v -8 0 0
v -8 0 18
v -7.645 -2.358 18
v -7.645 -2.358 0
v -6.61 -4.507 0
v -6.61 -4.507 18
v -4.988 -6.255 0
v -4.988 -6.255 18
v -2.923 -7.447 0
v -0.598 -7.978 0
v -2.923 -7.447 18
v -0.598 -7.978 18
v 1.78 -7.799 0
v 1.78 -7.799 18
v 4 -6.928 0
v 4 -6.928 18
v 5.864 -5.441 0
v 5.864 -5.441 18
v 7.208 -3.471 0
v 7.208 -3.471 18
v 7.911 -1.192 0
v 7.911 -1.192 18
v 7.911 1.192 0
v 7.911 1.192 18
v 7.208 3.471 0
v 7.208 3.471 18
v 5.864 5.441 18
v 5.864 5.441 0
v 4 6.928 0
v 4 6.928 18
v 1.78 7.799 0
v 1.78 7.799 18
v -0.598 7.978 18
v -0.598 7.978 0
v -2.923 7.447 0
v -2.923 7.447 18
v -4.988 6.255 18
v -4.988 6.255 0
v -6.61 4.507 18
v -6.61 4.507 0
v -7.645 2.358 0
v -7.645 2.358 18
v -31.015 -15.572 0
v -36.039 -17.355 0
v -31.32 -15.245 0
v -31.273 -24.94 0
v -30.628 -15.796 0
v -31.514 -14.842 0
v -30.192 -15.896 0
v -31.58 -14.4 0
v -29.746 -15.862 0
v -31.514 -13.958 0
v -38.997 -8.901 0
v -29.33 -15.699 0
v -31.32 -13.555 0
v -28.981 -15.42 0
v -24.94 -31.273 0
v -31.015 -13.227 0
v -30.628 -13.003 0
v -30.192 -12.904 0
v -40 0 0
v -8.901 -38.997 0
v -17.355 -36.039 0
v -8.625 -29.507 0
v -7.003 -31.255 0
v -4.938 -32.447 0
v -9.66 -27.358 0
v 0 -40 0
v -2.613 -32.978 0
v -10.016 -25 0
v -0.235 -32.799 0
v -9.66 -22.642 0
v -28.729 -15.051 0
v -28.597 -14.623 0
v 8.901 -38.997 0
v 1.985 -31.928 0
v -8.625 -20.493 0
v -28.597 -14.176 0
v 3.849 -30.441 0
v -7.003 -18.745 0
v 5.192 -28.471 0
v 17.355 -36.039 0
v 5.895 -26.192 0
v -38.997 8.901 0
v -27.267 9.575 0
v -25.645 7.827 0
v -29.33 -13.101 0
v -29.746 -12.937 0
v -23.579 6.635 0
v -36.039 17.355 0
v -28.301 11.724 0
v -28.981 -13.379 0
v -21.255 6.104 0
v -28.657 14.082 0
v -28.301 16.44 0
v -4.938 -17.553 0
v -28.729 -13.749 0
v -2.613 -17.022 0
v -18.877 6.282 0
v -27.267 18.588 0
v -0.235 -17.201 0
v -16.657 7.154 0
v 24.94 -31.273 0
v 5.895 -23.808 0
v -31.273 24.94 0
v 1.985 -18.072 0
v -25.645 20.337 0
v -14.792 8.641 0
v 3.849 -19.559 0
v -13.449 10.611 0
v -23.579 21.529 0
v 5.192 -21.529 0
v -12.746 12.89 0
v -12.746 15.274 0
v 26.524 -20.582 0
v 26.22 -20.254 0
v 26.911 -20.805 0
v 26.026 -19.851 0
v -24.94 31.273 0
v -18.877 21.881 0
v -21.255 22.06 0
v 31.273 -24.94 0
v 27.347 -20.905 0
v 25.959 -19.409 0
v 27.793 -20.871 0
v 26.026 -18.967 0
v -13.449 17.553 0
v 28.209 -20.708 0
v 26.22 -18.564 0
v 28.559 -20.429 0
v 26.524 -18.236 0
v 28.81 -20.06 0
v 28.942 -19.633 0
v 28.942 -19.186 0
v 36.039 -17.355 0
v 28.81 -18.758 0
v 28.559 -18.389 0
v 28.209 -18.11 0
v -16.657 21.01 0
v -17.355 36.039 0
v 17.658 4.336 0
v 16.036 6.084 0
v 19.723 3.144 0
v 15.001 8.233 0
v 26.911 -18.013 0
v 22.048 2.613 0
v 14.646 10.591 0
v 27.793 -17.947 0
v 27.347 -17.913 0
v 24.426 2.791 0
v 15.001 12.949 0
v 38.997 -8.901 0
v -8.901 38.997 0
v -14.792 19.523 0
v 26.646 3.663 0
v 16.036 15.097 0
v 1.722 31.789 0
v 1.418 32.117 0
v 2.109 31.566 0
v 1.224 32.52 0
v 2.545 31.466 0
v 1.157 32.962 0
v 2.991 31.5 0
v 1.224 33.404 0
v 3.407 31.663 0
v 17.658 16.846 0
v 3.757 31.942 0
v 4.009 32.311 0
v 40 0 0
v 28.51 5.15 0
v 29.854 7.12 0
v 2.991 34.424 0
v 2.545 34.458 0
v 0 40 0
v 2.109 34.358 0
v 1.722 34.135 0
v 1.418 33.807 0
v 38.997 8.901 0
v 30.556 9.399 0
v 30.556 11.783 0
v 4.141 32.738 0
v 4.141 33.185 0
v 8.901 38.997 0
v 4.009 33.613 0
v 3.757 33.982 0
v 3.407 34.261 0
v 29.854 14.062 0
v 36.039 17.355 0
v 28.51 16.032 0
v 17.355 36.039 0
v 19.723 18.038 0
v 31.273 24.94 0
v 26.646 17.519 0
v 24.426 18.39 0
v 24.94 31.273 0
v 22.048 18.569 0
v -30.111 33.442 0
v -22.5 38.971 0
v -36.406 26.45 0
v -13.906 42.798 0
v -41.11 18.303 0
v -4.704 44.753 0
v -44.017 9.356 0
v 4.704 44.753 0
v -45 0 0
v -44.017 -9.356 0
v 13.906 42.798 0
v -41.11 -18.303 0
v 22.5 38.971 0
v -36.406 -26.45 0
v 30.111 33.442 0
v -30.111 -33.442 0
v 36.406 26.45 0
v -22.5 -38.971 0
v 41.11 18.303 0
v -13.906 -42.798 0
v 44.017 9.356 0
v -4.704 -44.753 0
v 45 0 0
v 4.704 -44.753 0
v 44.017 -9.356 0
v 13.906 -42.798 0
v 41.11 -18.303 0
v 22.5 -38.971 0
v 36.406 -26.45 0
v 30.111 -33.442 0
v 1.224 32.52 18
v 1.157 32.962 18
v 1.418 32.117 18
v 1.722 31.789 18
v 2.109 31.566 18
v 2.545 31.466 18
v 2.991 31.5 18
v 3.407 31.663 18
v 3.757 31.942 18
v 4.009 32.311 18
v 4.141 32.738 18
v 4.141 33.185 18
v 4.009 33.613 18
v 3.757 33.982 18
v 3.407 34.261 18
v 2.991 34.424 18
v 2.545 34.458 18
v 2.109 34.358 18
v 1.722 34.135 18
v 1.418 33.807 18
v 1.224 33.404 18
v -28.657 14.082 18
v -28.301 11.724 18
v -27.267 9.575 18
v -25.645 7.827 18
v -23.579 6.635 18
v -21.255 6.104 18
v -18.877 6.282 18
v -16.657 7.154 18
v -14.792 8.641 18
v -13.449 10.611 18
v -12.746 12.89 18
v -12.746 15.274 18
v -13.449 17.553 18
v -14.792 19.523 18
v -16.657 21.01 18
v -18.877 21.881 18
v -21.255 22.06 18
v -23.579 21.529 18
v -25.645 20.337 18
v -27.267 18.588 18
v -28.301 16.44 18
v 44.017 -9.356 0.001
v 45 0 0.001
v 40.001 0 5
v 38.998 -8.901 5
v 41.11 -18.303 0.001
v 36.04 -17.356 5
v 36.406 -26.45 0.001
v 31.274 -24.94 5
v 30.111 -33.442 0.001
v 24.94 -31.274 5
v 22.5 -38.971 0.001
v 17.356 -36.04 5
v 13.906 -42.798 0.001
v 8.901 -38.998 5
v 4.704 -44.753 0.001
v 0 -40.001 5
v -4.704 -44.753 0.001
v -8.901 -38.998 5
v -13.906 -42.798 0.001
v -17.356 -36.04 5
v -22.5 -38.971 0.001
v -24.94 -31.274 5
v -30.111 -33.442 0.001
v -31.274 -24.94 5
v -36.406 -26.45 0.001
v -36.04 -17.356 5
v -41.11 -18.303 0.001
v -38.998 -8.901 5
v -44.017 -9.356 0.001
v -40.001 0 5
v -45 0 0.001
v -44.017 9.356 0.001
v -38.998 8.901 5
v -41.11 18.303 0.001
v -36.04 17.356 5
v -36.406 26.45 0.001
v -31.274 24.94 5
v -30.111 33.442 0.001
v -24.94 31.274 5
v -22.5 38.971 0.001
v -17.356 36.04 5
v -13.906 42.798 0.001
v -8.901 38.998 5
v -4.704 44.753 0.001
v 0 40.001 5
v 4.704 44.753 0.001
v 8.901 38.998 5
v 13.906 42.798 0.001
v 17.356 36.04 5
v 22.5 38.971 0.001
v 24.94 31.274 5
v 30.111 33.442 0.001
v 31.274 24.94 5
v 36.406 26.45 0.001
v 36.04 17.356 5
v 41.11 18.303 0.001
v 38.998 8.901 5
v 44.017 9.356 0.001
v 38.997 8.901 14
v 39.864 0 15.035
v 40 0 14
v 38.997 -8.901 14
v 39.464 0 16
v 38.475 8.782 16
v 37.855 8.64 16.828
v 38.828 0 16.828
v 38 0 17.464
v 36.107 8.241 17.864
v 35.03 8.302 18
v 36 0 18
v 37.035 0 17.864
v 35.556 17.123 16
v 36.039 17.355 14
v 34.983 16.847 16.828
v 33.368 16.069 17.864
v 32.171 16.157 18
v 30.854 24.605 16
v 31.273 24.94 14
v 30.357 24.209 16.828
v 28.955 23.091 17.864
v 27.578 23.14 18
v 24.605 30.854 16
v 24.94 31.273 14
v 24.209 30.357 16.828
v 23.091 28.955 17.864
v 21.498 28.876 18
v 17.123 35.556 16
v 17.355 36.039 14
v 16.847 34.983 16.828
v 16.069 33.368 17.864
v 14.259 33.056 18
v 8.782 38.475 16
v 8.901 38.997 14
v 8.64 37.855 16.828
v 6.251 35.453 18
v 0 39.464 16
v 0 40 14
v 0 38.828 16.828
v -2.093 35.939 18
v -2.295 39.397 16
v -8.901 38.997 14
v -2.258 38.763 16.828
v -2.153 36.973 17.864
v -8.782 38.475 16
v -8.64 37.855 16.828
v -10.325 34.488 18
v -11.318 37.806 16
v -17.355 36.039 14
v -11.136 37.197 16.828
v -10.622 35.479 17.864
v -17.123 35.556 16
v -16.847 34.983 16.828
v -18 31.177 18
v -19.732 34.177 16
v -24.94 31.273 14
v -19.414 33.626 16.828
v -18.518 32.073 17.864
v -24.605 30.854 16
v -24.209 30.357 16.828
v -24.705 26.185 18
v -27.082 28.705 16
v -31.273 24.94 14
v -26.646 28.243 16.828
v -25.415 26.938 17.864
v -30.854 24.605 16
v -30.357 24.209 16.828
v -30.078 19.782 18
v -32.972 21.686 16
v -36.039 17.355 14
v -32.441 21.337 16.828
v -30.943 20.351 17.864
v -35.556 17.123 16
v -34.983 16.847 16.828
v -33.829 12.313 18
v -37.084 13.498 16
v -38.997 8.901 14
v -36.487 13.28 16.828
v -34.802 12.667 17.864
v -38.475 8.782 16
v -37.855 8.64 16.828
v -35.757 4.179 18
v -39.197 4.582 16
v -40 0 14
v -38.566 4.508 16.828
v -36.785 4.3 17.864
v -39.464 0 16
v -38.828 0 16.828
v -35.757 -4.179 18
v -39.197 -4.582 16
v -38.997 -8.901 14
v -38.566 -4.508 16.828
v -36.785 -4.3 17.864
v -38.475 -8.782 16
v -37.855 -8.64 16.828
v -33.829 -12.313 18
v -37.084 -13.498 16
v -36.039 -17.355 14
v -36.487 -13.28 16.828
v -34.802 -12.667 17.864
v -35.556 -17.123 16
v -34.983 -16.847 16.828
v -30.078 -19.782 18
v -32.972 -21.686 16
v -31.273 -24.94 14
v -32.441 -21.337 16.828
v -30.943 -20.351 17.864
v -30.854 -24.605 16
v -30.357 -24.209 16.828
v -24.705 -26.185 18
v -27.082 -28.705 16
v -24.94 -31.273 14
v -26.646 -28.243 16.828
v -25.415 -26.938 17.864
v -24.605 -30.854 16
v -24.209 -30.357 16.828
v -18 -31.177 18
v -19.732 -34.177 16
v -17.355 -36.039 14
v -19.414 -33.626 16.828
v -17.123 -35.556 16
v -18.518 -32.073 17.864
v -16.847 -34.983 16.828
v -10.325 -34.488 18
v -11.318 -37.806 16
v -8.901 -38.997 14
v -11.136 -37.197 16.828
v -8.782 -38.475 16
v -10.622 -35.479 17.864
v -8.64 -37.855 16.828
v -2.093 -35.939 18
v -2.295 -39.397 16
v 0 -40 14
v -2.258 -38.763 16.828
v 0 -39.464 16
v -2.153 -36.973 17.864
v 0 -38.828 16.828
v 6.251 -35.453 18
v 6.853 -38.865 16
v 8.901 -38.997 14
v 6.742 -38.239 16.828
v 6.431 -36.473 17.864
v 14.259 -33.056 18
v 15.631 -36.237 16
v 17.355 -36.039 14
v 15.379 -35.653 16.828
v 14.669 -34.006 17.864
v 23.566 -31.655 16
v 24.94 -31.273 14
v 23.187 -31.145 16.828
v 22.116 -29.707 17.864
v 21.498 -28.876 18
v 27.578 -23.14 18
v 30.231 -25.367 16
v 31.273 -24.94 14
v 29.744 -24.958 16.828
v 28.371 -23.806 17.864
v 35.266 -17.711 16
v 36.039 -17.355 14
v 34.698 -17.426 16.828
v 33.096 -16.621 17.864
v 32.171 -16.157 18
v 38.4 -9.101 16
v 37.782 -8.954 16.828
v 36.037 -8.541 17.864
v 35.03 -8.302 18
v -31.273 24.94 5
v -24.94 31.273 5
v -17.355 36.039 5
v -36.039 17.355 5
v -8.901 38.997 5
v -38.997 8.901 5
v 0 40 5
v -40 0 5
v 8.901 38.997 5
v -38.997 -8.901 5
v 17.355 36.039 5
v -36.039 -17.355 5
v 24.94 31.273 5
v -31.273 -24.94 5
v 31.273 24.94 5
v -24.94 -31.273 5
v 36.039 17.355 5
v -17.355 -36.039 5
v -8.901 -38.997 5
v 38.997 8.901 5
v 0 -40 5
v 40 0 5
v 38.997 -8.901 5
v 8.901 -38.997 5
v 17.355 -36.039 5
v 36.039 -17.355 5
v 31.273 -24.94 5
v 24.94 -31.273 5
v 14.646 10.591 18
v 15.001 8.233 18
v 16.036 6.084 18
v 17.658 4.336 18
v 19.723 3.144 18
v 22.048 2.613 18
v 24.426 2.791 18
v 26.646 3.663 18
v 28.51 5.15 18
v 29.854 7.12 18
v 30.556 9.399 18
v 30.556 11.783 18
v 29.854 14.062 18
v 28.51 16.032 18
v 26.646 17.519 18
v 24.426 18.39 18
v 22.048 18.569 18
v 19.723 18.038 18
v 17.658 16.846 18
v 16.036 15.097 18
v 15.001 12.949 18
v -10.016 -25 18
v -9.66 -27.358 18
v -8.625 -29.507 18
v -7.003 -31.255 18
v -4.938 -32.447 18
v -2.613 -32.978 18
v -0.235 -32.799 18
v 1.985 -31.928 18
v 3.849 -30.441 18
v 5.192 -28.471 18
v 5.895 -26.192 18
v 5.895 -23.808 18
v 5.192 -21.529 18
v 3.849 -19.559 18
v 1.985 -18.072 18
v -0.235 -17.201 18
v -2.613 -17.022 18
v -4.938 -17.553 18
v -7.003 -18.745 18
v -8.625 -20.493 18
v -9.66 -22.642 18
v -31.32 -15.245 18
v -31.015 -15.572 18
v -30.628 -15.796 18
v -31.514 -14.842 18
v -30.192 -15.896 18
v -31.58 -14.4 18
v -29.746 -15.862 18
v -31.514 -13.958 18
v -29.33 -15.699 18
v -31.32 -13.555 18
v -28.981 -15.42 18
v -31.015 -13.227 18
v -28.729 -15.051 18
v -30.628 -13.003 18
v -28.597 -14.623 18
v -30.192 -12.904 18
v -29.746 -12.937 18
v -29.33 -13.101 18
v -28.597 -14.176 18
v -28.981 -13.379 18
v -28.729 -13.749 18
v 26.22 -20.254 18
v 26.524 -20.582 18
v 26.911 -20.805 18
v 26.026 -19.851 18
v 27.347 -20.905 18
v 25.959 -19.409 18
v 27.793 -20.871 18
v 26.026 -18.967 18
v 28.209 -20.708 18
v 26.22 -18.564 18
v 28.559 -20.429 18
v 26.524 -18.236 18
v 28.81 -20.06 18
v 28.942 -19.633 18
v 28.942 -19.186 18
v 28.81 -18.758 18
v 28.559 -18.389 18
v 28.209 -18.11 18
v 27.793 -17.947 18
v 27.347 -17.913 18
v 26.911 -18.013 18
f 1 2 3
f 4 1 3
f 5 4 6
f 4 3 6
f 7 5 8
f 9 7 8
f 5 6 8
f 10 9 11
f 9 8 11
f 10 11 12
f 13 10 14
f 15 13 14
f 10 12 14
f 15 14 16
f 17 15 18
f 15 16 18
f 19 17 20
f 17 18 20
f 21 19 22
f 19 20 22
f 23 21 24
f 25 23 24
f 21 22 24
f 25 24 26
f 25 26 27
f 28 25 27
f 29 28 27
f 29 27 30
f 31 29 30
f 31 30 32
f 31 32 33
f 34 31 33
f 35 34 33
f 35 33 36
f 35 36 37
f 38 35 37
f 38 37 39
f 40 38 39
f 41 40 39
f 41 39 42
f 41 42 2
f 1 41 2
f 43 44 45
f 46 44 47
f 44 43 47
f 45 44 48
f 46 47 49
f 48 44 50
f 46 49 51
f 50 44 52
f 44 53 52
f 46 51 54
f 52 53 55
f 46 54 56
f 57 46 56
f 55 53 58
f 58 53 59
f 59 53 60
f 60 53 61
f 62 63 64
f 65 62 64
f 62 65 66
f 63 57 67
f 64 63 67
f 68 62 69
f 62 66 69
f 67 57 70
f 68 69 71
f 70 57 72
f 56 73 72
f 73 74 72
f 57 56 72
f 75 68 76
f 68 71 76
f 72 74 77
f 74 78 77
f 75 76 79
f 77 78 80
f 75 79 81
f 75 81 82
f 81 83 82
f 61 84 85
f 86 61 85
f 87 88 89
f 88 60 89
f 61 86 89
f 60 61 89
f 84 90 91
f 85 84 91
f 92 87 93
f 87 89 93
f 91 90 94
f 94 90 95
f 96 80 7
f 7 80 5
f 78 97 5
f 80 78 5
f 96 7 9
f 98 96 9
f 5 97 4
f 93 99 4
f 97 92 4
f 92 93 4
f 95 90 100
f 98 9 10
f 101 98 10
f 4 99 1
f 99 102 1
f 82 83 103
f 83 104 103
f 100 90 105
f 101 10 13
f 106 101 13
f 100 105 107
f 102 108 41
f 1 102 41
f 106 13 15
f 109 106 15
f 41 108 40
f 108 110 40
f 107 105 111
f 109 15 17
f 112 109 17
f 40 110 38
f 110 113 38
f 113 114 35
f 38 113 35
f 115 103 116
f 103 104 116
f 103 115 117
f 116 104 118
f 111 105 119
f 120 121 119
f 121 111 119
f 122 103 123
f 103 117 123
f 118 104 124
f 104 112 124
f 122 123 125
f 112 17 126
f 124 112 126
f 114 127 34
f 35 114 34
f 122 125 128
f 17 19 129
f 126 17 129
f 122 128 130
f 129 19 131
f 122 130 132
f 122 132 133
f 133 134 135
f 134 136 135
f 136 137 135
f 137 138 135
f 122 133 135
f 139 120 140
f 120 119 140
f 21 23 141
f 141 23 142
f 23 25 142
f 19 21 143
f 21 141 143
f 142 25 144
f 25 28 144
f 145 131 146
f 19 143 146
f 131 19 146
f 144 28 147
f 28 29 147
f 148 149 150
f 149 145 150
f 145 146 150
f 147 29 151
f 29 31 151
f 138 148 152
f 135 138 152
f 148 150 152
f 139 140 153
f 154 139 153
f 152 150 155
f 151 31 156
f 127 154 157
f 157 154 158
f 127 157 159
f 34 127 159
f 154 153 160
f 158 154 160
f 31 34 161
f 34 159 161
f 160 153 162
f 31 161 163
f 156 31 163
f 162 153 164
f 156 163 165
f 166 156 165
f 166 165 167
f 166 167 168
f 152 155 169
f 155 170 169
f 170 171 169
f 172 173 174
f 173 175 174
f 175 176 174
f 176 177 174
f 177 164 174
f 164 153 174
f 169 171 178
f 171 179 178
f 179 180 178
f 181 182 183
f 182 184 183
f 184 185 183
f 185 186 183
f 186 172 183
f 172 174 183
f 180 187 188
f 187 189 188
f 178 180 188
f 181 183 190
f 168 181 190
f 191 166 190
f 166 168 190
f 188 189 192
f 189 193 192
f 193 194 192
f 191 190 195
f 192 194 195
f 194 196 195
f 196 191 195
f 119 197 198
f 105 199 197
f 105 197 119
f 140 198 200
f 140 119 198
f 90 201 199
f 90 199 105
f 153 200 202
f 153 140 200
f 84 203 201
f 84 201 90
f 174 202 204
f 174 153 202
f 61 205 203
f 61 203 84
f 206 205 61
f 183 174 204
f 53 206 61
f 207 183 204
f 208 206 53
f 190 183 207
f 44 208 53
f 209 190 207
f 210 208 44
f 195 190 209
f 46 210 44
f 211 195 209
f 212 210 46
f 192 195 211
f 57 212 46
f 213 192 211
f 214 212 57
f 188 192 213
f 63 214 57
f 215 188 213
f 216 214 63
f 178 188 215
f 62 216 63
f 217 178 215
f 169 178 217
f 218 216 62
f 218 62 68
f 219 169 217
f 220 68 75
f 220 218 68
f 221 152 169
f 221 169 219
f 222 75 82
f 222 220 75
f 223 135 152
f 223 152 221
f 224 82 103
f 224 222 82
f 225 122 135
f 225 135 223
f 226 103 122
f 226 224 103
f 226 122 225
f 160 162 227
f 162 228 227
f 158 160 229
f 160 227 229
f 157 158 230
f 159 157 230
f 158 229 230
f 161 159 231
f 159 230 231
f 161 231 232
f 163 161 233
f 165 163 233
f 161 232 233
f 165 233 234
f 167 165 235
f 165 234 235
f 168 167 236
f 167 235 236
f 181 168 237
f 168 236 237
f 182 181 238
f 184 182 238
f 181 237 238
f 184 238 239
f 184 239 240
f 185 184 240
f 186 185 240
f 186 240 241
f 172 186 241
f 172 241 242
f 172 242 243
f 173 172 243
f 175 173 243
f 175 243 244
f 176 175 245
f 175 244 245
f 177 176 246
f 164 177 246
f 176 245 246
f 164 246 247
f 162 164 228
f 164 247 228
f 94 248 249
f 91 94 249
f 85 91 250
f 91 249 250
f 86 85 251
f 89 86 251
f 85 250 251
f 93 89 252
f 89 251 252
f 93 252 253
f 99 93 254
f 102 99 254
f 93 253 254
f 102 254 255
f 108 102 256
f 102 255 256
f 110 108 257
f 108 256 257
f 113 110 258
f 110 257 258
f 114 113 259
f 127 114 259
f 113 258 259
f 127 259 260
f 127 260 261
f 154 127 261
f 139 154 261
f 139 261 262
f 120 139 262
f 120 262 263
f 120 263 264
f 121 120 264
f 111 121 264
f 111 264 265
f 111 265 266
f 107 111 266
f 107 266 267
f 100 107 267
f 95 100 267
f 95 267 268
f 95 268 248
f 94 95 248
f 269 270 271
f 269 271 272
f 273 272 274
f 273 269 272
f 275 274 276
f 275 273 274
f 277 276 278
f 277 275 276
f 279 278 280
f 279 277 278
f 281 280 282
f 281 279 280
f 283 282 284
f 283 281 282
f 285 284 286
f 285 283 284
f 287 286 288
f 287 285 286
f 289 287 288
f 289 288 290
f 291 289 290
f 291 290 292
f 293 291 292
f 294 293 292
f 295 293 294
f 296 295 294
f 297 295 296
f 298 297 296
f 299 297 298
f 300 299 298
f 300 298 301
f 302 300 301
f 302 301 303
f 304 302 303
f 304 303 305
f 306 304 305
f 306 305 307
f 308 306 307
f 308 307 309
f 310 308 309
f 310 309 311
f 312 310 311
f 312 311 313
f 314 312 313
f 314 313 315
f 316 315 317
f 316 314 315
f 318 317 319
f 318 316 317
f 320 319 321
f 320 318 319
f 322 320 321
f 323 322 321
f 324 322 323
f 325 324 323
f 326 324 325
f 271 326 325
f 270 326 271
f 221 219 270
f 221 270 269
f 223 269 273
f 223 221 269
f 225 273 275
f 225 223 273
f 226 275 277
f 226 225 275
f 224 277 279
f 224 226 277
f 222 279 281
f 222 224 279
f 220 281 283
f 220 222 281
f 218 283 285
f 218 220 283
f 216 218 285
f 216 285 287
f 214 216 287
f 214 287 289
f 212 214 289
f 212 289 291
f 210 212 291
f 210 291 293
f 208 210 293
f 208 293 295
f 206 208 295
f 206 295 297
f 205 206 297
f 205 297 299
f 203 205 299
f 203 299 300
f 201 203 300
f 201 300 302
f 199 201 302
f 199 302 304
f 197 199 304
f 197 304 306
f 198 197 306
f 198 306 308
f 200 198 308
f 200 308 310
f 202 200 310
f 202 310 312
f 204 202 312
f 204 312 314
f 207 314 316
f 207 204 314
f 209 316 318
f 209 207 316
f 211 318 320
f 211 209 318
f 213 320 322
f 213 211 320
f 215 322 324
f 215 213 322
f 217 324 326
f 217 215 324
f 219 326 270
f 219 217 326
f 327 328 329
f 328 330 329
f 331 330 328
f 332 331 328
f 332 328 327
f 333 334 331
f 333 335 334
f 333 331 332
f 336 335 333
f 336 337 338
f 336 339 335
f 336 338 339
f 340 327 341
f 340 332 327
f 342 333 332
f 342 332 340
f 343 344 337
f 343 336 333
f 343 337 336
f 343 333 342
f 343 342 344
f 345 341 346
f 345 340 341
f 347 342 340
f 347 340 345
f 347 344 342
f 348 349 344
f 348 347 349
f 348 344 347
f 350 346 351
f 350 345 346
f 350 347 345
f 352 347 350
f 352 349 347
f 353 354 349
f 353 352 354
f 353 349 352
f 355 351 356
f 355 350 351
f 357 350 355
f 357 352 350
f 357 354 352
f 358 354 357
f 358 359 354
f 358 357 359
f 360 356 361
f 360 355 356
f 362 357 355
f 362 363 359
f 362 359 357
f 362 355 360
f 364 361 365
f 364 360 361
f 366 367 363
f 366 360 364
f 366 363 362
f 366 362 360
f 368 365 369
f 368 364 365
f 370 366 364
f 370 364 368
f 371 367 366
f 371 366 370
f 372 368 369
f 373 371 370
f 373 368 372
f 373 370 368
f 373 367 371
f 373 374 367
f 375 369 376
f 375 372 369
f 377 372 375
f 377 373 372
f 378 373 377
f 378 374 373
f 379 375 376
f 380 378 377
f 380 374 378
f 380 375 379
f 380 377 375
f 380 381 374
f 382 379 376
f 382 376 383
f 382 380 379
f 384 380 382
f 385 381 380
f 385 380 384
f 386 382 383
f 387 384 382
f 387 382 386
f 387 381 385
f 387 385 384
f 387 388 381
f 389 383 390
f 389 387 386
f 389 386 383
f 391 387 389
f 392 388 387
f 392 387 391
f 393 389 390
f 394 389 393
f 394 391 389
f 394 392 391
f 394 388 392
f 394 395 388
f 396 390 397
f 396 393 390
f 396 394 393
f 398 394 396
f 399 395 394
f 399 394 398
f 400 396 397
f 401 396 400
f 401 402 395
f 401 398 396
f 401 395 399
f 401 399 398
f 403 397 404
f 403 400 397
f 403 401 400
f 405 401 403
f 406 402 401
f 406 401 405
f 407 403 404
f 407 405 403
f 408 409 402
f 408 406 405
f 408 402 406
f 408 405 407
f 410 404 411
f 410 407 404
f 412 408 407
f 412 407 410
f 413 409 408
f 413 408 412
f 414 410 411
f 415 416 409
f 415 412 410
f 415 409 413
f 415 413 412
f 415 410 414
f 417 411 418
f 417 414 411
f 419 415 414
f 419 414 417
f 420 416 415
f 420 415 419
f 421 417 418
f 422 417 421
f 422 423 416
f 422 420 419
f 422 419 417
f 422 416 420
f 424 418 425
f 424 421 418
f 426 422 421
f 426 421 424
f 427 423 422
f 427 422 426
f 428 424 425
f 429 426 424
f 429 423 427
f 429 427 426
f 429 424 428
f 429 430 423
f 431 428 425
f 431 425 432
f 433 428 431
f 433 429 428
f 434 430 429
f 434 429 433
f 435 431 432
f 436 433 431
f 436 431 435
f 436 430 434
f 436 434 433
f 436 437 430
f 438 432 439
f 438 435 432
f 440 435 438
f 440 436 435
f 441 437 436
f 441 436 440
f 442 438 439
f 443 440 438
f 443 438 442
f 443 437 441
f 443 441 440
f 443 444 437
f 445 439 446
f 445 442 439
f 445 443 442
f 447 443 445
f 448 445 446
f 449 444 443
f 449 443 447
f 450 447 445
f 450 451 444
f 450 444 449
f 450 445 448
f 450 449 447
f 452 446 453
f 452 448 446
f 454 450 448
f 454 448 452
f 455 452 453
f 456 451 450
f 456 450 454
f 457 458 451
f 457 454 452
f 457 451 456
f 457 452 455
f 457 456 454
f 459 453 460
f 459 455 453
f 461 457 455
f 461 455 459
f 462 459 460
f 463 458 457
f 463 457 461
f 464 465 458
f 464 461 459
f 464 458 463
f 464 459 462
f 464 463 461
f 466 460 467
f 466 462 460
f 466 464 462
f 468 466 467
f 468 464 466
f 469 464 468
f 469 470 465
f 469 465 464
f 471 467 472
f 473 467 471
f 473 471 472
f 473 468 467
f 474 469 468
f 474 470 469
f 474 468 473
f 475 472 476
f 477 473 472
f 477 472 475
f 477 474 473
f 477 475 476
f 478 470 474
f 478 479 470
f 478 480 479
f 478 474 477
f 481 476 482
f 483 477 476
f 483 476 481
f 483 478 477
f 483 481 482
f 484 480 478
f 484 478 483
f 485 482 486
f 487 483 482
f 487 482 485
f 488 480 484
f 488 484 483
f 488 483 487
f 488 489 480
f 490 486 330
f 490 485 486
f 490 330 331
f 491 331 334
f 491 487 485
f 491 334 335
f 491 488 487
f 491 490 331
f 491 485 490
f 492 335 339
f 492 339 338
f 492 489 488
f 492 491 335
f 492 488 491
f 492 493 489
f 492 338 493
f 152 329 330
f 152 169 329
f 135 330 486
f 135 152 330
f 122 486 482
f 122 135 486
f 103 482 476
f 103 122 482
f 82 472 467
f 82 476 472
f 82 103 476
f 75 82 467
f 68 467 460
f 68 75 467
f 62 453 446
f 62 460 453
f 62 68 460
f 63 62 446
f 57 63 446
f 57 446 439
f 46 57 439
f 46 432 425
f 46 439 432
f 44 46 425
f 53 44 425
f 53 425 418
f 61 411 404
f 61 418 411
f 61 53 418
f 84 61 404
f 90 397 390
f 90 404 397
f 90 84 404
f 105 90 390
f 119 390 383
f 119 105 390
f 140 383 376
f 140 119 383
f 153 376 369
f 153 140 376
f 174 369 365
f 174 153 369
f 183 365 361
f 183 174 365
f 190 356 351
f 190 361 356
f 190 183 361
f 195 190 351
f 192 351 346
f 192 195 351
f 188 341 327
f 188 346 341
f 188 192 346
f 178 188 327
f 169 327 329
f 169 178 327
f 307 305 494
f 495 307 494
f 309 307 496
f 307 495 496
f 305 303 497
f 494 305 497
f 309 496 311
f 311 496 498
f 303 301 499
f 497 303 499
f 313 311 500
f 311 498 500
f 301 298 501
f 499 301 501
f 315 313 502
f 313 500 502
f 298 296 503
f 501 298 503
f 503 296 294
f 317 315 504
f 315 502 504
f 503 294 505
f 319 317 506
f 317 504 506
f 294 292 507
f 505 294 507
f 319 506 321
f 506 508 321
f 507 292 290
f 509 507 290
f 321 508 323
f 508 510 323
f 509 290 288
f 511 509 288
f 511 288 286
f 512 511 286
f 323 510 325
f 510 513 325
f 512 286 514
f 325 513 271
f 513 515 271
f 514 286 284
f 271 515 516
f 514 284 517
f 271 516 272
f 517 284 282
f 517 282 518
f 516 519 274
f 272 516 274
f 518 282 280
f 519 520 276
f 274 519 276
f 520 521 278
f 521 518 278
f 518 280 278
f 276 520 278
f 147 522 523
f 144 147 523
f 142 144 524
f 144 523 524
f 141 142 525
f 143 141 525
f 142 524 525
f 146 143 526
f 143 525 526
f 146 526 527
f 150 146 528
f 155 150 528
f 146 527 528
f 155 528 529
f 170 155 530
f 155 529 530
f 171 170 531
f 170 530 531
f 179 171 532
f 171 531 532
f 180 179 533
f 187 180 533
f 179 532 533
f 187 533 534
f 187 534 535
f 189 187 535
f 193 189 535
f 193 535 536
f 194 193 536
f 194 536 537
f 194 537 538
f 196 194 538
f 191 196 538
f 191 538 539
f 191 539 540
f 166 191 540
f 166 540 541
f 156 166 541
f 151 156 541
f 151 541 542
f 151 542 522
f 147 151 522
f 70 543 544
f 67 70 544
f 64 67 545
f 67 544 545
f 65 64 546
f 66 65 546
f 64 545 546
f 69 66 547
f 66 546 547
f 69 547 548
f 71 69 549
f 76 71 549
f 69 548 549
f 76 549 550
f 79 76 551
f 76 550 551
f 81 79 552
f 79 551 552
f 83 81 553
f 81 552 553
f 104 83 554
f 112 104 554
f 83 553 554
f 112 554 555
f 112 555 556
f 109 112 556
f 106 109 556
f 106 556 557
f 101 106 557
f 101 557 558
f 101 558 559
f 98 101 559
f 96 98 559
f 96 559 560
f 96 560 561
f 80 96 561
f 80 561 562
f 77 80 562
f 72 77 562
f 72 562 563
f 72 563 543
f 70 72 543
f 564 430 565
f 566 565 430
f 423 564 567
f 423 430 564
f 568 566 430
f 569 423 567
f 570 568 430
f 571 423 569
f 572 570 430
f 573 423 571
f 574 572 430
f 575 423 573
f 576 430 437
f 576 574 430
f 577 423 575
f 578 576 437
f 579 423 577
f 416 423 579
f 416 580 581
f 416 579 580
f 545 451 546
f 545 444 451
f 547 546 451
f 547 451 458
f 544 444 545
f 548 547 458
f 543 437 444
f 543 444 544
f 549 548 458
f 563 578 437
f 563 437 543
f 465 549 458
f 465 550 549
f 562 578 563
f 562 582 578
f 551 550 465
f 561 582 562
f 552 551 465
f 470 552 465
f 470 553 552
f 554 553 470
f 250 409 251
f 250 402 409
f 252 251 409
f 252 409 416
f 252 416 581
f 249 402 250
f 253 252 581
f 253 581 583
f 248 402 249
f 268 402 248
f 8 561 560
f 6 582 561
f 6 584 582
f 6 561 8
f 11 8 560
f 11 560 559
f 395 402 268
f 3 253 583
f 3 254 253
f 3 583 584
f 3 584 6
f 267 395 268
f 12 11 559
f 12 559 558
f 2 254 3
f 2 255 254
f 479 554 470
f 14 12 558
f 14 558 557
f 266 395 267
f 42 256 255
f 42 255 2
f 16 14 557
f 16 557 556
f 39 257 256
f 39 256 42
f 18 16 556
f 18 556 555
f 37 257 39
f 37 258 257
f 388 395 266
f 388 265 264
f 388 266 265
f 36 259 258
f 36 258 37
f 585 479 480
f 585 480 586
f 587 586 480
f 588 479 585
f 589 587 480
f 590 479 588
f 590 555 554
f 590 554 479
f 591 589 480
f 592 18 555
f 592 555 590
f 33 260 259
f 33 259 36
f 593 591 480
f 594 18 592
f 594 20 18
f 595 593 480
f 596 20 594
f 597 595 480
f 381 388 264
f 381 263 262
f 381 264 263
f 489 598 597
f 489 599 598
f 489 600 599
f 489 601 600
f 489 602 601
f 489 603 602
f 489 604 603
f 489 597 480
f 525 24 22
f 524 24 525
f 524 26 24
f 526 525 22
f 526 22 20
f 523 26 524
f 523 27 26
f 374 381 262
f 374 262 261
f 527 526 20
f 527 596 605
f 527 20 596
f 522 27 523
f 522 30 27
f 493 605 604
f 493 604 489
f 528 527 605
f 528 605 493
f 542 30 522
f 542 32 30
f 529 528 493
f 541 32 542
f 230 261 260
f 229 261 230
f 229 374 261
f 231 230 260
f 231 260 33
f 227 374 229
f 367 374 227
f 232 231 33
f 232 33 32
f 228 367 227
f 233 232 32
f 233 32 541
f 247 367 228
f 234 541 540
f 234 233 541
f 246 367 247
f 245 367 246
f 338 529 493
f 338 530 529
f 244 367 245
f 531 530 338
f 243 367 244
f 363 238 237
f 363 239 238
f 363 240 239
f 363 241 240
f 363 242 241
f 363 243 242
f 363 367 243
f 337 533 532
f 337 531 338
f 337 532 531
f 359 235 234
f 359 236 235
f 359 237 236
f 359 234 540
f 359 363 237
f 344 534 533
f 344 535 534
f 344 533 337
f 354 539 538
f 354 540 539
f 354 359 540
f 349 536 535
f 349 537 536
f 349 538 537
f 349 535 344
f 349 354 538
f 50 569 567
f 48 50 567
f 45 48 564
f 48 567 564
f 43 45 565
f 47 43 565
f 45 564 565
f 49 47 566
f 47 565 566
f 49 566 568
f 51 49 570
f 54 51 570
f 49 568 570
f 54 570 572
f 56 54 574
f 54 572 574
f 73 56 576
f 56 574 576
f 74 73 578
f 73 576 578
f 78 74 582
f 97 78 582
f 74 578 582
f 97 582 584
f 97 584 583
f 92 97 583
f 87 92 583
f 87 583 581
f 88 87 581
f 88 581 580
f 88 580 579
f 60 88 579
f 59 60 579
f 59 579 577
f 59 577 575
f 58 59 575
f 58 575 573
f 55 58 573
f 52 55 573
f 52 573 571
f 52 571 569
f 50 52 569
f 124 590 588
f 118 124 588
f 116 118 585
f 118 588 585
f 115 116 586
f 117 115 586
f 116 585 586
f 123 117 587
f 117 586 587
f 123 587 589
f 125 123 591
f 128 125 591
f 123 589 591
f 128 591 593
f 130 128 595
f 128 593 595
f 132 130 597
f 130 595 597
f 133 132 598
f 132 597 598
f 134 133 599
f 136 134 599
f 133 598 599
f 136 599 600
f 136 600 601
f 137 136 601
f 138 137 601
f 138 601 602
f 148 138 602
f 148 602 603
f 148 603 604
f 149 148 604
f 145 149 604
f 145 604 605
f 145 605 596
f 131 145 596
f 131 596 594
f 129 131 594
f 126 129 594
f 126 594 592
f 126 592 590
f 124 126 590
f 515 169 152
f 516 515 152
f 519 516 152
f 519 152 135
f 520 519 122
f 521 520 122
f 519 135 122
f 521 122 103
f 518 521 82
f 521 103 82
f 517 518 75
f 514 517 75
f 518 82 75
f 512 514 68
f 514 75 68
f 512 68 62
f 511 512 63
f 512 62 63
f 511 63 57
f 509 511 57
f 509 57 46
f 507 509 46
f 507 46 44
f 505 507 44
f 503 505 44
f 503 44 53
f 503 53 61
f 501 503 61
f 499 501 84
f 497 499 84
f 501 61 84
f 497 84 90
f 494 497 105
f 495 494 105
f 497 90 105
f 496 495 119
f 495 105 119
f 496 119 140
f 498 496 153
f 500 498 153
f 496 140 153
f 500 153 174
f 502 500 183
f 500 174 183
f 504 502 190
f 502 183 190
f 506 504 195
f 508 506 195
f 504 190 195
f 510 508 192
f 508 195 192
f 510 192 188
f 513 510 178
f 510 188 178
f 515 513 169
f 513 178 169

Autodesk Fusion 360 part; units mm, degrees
sketch "Esquisse1" plane through (0, 0, 0) normal (0, 0, 1) x (1, 0, 0)
  circle A0 centre (0, 0) radius 40
  dimension "d1" = 80
extrude "Extrusion1" add sketch "Esquisse1" along normal blind 18 makes body 1
sketch "Esquisse2" plane through (0, 0, 18) normal (0, 0, 1) x (-1, 0, 0)
  circle A0 centre (0, 0) radius 40
  circle A1 centre (0, 0) radius 8
  circle A2 centre (20.6567, -14.0819) radius 8
  circle A3 centre (-22.6458, -10.5909) radius 8
  circle A4 centre (2.0155, 25) radius 8
  circle A5 centre (-2.6573, -32.9619) radius 1.5
  circle A6 centre (30.0802, 14.3997) radius 1.5
  circle A7 centre (-27.459, 19.4091) radius 1.5
  dimension "d4" = 16
  dimension "d5" = 16
  dimension "d6" = 16
  dimension "d7" = 16
  dimension "d8" = 25
  dimension "d9" = 25
  dimension "d10" = 25
  dimension "d11" = 43.3
  dimension "d12" = 43.3
  dimension "d13" = 43.3026
  dimension "d14" = 3
  dimension "d15" = 3
  dimension "d16" = 3
  dimension "d17" = 30
  dimension "d18" = 30
  dimension "d19" = 30
  dimension "d20" = 30
  dimension "d21" = 30
  dimension "d22" = 30
extrude "Extrusion2" cut sketch "Esquisse2" against normal blind 18 contours A1 | A2 | A3 | A4 | A5 | A6 | A7 bodies 1
fillet "Congé1" radius 4 1 edges at (-37.2931, -14.4646, 18) on bodies 1
sketch "Esquisse3" plane through (0, 0, 0) normal (0, 0, -1) x (1, 0, 0)
  circle A0 centre (-2.0155, 25) radius 8
  circle A1 centre (-20.6567, -14.0819) radius 8
  circle A2 centre (2.6573, -32.9619) radius 1.5
  circle A3 centre (-30.0802, 14.3997) radius 1.5
  circle A4 centre (0, 0) radius 8
  circle A5 centre (22.6458, -10.5909) radius 8
  circle A6 centre (27.459, 19.4091) radius 1.5
  circle A7 centre (0, 0) radius 40
  circle A8 centre (0, 0) radius 45
  dimension "d27" = 90
extrude "Extrusion3" add sketch "Esquisse3" against normal blind 5 separate body contours A8 makes body 2
chamfer "Chanfrein1" distance 5 angle 45 1 edges at (-41.9547, -16.2727, 5) on bodies 2
equation "d30 = 5 * mm"
